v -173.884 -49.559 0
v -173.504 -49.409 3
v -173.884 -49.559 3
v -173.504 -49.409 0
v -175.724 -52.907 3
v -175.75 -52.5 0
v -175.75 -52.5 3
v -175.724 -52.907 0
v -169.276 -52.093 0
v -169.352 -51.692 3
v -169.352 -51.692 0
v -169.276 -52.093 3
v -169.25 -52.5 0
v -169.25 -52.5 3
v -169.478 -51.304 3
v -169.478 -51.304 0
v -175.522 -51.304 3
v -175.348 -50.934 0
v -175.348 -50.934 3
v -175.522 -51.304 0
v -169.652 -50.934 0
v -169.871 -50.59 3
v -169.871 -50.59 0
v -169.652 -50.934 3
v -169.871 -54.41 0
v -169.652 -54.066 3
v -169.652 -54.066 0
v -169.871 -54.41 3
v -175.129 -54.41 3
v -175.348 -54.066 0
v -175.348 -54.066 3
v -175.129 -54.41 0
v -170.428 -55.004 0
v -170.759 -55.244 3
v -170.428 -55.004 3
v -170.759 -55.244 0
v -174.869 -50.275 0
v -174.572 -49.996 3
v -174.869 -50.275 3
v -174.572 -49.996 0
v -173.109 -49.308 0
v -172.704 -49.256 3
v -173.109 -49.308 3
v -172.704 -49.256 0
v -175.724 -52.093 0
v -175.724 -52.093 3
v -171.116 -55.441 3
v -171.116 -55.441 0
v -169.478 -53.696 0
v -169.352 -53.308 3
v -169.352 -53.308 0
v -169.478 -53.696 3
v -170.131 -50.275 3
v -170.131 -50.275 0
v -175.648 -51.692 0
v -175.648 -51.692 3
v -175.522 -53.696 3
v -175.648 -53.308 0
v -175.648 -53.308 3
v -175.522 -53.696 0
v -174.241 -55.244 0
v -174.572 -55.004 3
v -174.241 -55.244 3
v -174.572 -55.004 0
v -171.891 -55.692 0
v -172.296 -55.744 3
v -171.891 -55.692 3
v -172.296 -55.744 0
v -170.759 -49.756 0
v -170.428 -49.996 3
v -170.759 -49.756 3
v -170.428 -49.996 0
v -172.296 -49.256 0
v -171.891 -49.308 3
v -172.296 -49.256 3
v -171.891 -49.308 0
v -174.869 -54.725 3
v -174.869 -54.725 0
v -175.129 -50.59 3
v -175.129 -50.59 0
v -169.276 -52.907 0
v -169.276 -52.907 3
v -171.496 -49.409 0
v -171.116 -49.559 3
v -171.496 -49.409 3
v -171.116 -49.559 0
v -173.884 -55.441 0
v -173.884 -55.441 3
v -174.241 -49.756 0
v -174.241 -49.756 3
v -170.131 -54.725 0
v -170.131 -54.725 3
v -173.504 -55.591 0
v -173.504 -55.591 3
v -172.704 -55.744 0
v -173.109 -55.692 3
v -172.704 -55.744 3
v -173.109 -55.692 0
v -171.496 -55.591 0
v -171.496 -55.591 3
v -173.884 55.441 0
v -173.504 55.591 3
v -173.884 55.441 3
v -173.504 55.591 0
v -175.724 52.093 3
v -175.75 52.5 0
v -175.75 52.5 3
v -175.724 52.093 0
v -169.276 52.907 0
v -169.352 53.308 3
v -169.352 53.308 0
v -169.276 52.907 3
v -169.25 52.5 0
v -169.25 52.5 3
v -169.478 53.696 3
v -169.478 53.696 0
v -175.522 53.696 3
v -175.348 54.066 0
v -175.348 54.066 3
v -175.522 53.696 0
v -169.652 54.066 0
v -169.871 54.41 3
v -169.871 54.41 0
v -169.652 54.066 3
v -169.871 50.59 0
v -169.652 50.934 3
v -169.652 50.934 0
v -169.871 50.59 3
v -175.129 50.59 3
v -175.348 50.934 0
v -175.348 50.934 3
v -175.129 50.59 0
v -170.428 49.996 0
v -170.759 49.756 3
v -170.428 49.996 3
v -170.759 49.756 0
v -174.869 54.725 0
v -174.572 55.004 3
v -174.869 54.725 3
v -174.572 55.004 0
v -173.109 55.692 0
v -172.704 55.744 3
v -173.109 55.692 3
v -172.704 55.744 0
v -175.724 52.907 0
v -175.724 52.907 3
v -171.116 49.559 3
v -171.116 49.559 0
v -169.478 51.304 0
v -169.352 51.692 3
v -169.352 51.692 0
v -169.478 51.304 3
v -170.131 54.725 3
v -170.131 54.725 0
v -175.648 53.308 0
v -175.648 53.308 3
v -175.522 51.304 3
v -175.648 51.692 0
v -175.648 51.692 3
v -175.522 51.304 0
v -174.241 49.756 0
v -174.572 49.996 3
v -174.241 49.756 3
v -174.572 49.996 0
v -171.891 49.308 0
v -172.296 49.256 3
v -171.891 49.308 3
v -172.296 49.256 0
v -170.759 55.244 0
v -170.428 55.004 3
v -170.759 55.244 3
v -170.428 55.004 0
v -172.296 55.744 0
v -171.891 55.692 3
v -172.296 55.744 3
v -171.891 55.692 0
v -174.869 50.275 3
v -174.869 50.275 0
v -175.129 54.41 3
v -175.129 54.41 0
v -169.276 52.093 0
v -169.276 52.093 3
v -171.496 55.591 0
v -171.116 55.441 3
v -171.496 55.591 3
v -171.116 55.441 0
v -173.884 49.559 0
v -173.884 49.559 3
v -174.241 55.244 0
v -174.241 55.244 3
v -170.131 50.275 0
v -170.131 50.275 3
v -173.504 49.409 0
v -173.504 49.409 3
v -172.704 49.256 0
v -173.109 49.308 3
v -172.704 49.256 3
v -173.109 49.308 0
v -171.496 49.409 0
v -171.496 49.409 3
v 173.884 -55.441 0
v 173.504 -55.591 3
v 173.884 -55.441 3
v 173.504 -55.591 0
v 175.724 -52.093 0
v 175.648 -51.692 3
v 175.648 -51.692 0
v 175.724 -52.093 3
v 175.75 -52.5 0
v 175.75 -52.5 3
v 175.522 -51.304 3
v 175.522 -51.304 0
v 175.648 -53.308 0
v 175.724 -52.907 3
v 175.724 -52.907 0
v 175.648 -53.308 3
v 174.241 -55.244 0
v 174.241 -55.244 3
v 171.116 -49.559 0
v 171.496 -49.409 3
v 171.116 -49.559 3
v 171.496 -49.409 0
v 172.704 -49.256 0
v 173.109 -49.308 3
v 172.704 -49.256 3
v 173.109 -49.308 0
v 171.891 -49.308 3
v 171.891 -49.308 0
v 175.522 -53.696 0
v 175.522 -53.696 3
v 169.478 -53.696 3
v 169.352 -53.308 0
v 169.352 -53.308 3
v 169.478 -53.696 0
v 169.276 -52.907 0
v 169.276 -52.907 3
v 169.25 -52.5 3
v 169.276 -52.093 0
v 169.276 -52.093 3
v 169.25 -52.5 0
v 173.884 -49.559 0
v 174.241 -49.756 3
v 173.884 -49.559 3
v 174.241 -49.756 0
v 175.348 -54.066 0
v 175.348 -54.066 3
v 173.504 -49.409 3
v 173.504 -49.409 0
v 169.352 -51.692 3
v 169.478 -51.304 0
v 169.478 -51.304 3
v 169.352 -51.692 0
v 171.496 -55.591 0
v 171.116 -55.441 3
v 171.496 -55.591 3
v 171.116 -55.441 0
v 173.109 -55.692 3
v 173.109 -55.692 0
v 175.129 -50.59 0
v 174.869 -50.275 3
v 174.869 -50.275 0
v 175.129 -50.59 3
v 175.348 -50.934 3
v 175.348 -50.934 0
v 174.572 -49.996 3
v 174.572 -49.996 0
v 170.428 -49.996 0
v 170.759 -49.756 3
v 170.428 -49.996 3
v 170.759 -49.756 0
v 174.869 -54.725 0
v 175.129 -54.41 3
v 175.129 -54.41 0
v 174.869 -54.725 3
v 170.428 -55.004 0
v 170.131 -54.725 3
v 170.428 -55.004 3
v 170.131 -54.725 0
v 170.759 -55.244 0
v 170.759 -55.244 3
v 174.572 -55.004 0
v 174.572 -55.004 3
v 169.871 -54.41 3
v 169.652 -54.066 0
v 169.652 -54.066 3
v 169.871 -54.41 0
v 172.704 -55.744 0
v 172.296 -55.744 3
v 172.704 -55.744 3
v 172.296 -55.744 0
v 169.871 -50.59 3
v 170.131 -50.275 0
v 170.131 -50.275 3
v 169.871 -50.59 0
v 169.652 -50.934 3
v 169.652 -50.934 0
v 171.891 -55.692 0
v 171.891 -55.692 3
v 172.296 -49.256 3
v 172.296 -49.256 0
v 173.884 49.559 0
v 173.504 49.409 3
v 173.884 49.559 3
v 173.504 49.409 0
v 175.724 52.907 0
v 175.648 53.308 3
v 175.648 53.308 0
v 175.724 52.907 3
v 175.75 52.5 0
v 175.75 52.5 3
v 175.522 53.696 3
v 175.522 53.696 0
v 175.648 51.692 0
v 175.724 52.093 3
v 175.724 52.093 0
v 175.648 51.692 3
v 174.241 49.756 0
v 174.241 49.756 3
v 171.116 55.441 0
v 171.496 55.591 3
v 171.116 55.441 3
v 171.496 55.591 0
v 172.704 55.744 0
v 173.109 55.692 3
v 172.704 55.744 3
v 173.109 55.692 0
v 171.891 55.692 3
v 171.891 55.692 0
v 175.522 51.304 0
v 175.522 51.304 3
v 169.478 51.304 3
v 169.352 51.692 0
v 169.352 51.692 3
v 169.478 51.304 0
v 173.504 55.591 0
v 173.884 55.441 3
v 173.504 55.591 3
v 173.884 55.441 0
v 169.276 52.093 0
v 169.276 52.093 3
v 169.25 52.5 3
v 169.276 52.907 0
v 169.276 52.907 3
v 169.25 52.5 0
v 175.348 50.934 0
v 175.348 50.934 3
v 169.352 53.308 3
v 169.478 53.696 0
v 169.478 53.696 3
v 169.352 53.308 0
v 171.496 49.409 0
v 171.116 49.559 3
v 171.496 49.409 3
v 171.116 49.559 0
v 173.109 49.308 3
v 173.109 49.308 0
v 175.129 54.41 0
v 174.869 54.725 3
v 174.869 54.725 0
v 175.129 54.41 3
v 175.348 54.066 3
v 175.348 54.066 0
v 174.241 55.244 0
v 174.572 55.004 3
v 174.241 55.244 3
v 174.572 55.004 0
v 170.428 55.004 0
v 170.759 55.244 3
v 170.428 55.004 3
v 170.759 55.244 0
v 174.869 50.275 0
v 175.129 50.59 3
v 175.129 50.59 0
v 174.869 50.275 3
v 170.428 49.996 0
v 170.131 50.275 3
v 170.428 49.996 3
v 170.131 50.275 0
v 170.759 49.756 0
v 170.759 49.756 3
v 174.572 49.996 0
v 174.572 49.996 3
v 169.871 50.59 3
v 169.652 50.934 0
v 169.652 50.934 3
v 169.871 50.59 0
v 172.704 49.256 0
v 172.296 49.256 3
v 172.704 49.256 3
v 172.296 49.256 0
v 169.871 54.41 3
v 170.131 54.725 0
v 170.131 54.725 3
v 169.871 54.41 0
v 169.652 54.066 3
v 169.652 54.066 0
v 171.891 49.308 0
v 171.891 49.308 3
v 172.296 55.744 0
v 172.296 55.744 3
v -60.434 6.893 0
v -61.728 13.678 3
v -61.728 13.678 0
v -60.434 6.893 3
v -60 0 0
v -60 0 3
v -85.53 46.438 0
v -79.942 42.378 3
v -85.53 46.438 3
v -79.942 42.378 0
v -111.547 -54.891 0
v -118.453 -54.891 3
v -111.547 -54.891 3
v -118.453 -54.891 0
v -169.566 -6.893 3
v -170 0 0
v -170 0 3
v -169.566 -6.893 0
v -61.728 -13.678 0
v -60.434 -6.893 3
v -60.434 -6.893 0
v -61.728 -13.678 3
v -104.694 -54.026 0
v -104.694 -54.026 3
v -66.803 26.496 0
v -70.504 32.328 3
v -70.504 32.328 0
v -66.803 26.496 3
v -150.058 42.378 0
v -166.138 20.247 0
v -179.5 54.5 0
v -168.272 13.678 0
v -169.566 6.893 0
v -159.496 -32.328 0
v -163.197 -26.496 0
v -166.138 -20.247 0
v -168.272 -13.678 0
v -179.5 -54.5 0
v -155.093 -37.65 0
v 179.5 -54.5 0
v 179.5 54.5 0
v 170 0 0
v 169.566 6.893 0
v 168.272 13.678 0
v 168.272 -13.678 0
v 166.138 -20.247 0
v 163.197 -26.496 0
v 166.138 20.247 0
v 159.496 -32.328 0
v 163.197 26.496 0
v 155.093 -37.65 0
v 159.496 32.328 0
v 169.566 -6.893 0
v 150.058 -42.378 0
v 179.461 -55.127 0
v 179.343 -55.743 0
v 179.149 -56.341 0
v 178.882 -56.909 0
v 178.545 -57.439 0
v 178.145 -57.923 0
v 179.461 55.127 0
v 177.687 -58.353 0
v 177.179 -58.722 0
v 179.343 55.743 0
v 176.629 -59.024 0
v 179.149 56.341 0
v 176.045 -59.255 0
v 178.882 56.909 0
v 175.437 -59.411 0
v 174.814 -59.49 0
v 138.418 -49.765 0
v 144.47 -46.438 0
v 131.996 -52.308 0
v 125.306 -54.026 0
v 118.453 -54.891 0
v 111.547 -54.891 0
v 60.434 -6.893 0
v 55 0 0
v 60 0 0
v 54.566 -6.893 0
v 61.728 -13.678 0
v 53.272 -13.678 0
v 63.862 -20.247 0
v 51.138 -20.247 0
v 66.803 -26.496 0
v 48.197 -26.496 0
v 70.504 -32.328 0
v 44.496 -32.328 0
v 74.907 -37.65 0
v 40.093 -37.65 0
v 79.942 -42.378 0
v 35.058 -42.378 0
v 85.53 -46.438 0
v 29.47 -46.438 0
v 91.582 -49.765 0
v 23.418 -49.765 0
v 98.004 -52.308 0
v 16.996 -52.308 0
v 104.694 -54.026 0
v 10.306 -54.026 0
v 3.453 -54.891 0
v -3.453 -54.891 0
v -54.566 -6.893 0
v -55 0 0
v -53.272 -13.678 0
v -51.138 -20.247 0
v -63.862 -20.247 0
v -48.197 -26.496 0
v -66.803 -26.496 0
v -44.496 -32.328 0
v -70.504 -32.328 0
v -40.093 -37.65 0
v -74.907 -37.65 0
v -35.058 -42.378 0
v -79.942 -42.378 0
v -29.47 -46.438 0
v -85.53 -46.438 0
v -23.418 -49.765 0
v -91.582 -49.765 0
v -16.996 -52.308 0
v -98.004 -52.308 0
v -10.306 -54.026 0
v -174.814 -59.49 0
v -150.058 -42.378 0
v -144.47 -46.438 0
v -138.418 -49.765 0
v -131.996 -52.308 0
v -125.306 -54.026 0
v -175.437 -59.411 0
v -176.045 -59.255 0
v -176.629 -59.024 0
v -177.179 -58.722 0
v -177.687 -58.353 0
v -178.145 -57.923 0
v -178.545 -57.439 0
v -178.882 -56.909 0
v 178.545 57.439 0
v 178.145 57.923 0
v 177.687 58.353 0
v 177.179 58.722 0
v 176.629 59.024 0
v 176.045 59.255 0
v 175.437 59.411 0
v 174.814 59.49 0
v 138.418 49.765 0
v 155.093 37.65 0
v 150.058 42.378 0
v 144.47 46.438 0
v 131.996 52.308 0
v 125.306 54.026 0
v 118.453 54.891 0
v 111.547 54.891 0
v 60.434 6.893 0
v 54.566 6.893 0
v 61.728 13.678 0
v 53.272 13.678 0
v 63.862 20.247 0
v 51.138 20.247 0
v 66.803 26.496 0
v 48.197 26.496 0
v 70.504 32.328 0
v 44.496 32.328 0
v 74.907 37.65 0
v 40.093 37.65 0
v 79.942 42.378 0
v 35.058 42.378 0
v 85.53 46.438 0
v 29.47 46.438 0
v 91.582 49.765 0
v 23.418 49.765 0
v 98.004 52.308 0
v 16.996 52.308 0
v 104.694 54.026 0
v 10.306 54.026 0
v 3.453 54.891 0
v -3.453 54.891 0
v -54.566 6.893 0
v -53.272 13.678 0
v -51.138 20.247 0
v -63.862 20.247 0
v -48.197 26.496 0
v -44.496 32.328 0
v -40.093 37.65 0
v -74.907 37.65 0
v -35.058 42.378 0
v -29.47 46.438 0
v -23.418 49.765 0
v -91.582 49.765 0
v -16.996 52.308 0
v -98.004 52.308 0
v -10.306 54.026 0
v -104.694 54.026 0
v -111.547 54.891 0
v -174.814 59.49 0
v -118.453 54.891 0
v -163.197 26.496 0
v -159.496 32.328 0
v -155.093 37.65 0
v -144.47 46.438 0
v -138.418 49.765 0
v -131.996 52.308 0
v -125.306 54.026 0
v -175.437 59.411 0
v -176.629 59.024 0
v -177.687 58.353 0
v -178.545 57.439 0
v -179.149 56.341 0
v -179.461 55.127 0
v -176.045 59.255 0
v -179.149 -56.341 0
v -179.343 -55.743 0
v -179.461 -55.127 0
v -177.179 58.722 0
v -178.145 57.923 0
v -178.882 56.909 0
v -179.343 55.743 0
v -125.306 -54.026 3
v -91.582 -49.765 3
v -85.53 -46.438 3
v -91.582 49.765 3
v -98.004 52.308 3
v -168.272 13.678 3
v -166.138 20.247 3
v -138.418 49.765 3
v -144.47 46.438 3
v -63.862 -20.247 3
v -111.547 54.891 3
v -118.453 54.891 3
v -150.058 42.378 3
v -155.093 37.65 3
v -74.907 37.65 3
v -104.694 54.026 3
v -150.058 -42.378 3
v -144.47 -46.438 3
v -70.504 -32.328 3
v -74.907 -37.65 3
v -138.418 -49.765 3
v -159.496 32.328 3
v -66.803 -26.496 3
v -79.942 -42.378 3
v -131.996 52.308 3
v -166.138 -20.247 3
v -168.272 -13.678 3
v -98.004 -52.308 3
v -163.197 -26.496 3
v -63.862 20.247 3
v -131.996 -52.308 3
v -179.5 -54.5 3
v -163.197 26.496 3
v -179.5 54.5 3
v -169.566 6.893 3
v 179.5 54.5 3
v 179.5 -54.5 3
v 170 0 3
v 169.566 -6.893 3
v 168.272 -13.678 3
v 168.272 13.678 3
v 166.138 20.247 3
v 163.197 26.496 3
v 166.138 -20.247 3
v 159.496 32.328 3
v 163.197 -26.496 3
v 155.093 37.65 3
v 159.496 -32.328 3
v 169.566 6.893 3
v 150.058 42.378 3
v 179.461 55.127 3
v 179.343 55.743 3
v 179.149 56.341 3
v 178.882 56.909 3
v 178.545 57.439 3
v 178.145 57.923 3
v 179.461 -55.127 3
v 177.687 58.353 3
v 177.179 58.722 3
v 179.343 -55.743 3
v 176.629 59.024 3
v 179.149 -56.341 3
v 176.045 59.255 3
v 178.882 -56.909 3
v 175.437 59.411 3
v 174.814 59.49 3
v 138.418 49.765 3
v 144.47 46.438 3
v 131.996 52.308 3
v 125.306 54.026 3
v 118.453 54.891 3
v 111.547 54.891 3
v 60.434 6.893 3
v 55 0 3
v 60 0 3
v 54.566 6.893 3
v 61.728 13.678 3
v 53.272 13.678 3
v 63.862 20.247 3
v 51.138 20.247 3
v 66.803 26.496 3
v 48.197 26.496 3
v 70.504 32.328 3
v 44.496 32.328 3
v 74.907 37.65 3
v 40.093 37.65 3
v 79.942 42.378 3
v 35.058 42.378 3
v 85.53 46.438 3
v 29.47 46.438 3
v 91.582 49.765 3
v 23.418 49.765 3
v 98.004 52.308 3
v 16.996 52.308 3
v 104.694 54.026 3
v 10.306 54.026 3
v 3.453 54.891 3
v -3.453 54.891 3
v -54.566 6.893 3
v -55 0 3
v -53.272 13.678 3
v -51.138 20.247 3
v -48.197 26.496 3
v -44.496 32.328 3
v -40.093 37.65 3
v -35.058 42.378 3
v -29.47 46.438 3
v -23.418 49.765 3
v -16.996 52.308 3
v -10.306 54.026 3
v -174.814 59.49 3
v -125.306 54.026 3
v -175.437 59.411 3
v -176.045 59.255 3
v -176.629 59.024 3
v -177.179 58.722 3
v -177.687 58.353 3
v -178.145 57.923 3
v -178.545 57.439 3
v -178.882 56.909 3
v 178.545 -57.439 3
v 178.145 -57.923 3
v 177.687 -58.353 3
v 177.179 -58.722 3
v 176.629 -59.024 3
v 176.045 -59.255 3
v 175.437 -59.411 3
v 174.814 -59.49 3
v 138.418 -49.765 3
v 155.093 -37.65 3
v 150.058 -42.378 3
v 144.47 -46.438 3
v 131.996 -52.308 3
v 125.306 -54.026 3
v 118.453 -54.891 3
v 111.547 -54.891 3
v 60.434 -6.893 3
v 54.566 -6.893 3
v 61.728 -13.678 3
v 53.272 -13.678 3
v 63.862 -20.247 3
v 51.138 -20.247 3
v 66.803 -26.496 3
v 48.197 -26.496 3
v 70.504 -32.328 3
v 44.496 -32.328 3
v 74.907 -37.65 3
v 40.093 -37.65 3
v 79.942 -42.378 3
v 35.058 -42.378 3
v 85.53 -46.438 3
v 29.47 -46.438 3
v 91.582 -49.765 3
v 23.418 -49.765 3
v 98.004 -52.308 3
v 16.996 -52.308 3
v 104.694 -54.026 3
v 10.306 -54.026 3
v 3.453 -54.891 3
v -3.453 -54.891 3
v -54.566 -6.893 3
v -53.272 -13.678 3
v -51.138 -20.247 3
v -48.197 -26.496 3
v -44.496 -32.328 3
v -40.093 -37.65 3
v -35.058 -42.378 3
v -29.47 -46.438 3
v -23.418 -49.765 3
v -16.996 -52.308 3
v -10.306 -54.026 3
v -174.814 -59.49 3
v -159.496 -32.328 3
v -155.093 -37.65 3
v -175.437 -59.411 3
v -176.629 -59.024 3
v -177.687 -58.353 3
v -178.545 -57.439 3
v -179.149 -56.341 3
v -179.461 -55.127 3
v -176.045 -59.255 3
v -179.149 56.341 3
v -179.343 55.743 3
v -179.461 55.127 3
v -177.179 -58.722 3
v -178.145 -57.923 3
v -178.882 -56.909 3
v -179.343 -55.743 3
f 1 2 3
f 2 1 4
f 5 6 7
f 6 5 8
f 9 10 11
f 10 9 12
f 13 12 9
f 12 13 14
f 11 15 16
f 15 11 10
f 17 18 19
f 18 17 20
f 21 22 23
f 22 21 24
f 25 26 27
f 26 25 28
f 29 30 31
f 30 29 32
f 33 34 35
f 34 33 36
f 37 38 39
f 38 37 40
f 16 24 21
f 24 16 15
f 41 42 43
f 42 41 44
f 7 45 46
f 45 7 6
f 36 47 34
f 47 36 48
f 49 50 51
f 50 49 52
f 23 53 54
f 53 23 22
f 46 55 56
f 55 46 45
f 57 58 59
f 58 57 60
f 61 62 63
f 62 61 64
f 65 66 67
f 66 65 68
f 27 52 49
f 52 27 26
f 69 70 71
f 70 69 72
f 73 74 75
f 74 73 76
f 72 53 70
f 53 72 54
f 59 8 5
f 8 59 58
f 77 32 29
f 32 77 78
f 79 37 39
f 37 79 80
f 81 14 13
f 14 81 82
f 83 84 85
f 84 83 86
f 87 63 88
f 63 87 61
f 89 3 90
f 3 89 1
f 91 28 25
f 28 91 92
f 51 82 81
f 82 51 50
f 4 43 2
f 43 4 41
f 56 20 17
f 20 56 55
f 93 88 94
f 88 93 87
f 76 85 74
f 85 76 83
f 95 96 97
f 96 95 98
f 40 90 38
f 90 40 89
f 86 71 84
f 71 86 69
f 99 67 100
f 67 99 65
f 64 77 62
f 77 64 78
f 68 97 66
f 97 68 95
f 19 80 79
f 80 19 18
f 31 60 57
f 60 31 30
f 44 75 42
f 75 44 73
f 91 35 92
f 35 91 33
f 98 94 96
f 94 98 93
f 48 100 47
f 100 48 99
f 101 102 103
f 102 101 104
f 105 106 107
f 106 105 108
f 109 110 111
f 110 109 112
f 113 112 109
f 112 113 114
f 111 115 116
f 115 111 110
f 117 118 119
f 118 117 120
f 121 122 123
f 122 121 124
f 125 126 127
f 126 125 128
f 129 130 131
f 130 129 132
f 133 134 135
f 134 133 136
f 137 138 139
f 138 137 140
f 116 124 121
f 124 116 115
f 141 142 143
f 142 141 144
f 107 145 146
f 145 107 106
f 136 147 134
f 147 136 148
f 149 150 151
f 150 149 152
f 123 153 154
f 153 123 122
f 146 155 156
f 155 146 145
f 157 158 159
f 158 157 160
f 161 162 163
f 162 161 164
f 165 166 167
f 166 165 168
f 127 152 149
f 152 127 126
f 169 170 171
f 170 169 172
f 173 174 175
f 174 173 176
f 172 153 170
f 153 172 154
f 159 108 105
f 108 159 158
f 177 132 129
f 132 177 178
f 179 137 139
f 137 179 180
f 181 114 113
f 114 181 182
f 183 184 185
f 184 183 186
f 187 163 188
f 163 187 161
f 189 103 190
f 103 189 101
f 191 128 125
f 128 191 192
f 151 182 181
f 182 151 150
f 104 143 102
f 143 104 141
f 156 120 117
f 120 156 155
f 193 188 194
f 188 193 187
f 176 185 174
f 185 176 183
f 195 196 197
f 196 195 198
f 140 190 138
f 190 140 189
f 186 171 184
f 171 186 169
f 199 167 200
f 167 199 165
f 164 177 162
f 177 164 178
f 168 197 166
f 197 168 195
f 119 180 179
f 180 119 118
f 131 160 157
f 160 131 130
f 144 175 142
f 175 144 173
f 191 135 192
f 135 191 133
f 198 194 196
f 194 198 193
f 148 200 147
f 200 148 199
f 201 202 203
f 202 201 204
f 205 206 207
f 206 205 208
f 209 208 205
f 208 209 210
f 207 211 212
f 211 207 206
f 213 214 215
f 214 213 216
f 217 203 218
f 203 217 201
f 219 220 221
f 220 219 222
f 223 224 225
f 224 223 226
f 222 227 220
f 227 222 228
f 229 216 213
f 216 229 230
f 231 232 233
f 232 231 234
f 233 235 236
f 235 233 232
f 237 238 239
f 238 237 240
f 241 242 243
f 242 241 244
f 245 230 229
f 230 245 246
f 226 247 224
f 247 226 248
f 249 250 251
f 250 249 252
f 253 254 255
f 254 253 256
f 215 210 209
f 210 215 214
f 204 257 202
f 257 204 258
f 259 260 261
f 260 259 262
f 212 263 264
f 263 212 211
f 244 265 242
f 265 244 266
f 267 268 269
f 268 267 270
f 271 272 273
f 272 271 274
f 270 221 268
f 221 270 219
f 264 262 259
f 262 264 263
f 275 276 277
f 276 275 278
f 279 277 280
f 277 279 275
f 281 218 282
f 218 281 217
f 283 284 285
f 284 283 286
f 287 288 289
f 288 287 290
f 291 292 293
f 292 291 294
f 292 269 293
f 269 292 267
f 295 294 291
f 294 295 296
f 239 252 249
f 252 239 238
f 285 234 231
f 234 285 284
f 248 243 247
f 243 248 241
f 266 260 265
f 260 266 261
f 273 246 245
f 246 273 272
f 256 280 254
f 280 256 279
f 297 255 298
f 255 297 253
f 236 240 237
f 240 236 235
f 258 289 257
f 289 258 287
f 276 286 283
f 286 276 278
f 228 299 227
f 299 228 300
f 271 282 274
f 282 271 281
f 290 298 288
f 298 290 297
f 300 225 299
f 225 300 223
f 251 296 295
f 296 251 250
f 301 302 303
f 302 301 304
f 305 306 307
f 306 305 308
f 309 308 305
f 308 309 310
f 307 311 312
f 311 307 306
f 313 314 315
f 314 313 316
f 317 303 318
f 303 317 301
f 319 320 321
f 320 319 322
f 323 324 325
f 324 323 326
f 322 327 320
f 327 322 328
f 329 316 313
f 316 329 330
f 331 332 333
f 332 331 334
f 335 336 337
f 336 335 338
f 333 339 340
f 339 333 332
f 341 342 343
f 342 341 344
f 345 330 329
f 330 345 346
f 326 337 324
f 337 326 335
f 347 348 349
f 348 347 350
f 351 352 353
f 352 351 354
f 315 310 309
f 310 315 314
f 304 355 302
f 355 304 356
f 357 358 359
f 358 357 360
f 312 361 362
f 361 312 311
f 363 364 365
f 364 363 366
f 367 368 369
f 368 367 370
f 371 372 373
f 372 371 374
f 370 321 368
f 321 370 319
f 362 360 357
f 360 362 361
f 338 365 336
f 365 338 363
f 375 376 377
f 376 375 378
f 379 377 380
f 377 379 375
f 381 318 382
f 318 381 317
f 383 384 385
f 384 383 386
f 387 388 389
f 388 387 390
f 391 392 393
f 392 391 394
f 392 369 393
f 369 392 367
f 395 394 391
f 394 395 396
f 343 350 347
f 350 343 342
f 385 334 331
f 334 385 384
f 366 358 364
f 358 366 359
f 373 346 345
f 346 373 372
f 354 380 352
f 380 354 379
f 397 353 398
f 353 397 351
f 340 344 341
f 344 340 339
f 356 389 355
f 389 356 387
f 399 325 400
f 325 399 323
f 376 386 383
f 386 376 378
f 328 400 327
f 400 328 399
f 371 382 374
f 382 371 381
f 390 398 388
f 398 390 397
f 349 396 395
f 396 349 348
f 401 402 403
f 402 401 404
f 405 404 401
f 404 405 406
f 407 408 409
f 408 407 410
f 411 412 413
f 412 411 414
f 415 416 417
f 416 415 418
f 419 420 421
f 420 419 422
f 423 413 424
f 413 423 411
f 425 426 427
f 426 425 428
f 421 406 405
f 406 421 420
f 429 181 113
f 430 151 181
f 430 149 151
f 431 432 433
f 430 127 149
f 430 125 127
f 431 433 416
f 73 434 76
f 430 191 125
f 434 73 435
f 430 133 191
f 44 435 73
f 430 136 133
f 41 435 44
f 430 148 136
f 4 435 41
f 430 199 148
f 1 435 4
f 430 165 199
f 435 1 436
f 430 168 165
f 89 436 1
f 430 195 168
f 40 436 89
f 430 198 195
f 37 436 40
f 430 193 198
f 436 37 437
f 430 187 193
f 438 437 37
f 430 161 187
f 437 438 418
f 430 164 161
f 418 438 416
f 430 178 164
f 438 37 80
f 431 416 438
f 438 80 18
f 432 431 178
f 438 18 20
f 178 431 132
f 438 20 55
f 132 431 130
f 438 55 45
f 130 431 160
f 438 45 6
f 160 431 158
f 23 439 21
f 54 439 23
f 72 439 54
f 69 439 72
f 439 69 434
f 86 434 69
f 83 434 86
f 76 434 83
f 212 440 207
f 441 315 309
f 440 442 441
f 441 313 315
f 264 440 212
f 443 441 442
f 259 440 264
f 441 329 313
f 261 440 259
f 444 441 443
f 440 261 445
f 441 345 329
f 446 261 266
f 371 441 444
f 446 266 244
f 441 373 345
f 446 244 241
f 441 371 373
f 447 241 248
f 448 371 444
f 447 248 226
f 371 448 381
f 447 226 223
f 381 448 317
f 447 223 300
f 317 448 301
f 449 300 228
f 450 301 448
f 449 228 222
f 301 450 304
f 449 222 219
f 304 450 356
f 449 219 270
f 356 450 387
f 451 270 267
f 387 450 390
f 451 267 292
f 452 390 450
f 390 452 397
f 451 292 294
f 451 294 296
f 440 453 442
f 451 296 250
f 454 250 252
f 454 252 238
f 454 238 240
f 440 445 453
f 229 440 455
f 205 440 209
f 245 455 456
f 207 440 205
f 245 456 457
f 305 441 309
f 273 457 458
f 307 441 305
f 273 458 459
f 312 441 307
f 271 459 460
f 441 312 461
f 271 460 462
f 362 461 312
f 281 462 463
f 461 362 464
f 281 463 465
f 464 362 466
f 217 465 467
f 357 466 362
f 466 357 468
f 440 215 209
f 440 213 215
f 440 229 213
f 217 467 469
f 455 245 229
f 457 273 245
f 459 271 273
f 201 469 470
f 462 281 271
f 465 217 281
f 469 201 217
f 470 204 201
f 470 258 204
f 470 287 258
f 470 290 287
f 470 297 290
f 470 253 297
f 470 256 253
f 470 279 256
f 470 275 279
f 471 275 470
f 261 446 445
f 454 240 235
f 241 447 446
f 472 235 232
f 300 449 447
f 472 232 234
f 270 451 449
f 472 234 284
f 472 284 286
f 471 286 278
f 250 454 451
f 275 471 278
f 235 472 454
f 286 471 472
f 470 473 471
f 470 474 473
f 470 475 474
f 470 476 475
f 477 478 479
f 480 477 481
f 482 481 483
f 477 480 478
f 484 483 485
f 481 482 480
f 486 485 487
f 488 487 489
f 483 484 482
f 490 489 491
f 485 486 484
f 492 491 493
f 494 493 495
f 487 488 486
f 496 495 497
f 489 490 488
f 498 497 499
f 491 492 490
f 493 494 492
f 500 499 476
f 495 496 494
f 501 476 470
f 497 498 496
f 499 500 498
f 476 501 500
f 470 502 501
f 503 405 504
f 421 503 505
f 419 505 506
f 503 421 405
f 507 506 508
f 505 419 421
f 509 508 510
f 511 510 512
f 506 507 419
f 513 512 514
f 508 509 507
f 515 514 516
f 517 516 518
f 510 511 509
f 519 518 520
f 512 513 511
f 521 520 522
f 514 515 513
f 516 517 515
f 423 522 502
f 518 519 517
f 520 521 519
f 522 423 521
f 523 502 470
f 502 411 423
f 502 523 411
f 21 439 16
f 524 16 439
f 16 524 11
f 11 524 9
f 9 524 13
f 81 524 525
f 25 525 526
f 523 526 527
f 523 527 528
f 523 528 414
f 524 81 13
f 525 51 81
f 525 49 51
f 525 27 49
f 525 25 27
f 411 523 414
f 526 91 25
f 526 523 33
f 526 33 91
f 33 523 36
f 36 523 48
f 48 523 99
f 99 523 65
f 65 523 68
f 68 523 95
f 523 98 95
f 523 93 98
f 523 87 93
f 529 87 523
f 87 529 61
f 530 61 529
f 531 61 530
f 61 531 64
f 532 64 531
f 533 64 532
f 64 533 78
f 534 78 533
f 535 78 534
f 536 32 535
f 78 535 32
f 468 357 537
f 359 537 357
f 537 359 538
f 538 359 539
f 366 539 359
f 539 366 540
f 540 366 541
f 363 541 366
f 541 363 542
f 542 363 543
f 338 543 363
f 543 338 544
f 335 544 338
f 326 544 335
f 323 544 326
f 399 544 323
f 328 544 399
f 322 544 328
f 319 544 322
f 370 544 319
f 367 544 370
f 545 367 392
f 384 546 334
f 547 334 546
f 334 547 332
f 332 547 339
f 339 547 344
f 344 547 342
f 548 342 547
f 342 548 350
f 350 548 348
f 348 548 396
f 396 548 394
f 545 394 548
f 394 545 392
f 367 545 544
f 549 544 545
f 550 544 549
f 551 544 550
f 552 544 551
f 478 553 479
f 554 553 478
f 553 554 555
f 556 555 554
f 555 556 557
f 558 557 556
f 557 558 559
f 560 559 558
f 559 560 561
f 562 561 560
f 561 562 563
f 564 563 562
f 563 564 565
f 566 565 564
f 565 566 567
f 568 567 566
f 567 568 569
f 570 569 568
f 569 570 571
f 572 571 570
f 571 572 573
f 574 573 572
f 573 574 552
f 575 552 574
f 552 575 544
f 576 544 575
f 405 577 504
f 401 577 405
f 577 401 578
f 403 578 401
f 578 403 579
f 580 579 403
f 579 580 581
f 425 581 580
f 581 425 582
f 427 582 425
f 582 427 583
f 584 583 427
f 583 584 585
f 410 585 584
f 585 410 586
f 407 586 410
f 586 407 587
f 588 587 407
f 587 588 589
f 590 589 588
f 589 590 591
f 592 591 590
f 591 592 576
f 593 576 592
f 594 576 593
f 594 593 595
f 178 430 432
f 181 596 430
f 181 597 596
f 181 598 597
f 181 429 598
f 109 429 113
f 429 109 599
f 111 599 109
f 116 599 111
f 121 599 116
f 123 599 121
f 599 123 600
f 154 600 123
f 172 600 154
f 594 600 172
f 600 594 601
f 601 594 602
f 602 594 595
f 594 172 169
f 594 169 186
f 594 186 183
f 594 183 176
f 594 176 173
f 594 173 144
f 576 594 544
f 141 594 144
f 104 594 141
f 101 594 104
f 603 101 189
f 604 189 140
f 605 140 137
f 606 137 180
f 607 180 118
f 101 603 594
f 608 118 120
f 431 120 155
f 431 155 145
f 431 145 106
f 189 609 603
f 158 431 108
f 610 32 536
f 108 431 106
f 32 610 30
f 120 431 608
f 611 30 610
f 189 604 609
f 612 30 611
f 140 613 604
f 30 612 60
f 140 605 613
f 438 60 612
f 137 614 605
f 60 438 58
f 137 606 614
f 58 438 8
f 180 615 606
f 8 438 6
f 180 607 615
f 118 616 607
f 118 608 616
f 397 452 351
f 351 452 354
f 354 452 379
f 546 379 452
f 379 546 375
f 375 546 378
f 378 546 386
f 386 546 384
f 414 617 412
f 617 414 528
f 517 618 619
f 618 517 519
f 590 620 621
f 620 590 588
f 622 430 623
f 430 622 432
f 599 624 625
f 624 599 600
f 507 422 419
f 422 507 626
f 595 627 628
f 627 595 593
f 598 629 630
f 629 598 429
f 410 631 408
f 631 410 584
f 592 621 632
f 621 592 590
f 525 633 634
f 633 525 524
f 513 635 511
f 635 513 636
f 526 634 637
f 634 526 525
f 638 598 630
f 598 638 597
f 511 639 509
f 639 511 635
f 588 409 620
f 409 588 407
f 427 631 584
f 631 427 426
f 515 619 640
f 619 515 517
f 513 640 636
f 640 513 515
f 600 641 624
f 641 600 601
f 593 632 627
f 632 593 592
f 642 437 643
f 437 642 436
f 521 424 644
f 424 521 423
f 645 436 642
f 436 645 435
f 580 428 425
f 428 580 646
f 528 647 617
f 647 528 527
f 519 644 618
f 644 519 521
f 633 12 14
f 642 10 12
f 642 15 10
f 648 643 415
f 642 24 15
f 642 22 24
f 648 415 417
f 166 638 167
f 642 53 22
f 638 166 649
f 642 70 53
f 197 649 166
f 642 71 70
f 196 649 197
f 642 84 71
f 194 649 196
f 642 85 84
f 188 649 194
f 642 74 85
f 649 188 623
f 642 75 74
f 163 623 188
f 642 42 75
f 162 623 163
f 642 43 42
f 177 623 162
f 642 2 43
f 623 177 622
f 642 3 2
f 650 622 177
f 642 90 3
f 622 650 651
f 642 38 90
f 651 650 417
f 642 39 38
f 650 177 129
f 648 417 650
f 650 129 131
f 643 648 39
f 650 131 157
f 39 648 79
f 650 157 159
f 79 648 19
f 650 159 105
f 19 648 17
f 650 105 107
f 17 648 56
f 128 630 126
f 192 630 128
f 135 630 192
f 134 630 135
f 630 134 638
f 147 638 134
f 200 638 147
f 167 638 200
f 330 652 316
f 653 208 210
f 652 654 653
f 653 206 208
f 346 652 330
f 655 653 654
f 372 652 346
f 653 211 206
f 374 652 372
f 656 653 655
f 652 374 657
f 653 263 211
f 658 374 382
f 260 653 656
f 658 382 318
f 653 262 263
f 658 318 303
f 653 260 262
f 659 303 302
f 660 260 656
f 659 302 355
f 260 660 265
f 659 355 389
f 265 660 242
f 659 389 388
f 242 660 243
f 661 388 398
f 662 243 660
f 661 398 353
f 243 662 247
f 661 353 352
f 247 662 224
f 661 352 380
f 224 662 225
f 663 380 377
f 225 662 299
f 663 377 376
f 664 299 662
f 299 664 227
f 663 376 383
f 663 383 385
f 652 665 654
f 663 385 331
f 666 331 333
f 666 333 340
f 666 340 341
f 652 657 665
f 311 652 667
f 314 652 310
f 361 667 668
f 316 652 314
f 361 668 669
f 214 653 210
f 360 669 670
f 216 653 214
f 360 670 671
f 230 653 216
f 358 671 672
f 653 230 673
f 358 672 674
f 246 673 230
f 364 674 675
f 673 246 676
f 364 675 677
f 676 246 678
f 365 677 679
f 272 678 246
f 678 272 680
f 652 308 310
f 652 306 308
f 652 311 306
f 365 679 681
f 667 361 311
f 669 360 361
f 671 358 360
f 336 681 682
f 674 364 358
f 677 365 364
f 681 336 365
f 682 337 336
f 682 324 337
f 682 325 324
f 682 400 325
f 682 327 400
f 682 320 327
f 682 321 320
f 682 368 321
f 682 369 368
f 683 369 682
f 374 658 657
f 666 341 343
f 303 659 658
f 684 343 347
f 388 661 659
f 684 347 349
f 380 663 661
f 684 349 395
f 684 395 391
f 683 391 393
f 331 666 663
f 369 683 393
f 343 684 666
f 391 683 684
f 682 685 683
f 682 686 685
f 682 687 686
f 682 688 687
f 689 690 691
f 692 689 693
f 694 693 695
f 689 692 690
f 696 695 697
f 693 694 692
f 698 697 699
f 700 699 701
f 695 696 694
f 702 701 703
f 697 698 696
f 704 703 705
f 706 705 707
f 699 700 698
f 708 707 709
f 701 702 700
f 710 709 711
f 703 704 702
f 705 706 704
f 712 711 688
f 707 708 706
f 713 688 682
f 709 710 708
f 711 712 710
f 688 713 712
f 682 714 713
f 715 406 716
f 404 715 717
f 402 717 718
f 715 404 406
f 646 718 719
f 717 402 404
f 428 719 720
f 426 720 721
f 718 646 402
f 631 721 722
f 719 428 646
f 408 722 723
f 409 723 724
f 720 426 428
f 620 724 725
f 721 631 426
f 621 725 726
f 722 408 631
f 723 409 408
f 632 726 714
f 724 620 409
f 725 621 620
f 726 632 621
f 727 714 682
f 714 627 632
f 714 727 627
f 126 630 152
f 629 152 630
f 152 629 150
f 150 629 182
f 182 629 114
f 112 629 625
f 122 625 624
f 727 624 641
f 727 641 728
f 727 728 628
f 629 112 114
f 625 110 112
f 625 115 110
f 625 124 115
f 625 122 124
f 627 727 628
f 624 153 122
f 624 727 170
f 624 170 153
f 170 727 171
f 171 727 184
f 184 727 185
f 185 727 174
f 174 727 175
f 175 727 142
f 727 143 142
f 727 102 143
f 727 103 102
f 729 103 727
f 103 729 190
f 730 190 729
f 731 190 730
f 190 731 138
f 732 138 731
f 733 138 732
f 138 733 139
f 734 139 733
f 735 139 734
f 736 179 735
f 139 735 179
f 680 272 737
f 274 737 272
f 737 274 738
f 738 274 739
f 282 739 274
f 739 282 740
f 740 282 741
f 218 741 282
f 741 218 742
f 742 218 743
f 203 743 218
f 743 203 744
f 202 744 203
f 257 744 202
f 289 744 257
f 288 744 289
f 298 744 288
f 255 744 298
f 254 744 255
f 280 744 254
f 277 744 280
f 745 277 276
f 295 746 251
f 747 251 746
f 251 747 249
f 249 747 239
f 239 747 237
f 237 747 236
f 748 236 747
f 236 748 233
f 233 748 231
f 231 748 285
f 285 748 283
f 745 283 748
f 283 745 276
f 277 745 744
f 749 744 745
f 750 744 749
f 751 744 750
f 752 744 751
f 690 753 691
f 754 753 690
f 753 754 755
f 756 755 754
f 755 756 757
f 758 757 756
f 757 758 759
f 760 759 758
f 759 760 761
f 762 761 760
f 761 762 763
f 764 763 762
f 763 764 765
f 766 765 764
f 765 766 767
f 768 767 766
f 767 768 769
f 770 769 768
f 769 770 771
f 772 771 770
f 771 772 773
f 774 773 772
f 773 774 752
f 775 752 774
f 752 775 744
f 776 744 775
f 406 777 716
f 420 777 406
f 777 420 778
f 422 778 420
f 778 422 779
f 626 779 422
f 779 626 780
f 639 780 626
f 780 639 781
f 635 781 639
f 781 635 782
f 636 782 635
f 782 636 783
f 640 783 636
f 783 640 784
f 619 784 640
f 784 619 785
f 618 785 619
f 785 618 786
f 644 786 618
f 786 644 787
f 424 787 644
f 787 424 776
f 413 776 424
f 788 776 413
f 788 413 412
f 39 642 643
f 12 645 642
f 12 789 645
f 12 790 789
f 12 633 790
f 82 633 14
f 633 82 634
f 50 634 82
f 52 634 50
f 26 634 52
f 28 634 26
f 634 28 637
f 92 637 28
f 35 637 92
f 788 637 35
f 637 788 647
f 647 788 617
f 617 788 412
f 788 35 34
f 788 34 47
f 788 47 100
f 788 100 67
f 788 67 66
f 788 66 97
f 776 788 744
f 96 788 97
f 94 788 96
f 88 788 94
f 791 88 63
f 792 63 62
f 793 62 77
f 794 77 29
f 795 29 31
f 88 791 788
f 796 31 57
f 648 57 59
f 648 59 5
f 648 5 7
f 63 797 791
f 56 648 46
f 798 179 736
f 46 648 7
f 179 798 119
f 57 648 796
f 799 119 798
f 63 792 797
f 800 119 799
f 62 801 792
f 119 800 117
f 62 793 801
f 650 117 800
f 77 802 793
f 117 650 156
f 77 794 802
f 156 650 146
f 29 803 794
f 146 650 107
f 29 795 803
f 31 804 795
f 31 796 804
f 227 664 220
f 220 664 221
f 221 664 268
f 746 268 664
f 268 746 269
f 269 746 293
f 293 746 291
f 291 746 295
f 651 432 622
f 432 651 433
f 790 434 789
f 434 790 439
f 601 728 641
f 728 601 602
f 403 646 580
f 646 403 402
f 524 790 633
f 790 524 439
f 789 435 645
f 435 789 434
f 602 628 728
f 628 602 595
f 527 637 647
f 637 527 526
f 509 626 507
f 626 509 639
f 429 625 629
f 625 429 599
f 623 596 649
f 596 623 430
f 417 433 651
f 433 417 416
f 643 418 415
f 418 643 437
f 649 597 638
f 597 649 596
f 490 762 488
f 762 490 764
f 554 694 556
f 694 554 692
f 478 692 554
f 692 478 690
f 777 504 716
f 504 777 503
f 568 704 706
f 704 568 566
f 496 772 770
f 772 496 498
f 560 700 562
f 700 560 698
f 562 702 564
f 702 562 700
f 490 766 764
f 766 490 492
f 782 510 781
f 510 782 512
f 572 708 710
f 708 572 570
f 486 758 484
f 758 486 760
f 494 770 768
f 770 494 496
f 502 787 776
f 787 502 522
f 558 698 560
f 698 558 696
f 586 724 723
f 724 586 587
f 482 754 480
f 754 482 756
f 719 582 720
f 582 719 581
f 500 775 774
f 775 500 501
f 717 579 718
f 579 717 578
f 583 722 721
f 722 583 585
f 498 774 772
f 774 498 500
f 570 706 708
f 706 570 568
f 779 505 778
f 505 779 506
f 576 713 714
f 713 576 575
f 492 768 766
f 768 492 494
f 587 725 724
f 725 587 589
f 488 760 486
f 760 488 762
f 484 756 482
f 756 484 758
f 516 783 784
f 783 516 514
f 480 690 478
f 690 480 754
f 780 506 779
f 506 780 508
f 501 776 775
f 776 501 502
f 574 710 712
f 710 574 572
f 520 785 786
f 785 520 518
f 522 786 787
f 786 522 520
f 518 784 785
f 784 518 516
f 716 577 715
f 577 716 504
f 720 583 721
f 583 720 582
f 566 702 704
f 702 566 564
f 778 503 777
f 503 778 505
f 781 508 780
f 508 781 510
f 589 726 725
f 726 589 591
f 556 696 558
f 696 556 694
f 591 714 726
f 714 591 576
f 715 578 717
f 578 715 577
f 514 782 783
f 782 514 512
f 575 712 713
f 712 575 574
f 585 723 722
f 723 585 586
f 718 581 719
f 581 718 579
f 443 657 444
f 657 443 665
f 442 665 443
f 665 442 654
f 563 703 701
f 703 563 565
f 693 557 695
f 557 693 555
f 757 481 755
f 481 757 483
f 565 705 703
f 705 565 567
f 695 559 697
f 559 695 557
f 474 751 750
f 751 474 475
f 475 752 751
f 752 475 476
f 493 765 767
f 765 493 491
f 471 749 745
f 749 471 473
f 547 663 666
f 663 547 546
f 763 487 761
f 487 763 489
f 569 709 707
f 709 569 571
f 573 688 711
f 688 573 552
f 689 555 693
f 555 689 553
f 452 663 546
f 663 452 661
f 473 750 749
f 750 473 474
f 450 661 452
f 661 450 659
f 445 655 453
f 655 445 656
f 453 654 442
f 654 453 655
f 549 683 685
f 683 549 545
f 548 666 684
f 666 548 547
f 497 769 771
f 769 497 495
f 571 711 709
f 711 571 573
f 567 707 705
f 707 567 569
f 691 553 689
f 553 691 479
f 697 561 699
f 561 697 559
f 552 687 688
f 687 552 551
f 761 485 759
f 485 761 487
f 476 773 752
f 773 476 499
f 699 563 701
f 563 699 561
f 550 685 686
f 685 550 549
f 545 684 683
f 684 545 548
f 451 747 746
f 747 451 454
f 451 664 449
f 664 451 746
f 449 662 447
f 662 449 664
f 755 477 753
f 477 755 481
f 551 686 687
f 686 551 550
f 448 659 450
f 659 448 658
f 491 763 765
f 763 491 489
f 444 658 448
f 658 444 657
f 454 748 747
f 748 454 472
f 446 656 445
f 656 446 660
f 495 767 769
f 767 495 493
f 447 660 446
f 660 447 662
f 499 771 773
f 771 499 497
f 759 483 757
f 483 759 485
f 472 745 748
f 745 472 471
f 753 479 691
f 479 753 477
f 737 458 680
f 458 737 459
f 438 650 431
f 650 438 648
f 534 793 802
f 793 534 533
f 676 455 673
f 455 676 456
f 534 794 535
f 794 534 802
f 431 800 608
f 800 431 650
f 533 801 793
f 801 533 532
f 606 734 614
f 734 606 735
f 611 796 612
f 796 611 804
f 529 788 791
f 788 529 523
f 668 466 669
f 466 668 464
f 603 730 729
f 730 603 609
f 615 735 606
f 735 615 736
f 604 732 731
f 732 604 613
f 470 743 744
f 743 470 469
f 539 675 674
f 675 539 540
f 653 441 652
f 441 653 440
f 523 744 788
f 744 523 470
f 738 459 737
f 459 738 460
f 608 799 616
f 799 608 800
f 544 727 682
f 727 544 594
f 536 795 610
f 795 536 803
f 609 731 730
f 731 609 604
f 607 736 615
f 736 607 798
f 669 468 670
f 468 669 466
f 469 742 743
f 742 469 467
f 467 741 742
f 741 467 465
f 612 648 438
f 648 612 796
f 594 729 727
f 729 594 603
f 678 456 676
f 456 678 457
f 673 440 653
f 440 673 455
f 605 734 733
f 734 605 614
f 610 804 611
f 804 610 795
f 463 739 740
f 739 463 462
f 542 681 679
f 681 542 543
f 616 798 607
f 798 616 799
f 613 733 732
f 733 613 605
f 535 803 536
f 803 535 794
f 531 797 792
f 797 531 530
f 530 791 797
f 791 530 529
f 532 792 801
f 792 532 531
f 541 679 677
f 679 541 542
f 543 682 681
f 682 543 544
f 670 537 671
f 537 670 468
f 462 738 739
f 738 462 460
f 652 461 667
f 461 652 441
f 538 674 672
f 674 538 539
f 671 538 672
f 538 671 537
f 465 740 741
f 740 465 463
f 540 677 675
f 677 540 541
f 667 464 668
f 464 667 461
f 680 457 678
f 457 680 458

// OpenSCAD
$fn = 50;

difference() {
	union() {
		hull() {
			translate(v = [-174.5, 54.5, 0]) {
				cylinder(h = 3, r = 5);
			}
			translate(v = [174.5, 54.5, 0]) {
				cylinder(h = 3, r = 5);
			}
			translate(v = [-174.5, -54.5, 0]) {
				cylinder(h = 3, r = 5);
			}
			translate(v = [174.5, -54.5, 0]) {
				cylinder(h = 3, r = 5);
			}
		}
	}
	union() {
		translate(v = [-172.5, -52.5, -100.0]) {
			cylinder(h = 200, r = 3.25);
		}
		translate(v = [-172.5, 52.5, -100.0]) {
			cylinder(h = 200, r = 3.25);
		}
		translate(v = [172.5, -52.5, -100.0]) {
			cylinder(h = 200, r = 3.25);
		}
		translate(v = [172.5, 52.5, -100.0]) {
			cylinder(h = 200, r = 3.25);
		}
		translate(v = [-172.5, -52.5, -100.0]) {
			cylinder(h = 200, r = 1.8);
		}
		translate(v = [-172.5, 52.5, -100.0]) {
			cylinder(h = 200, r = 1.8);
		}
		translate(v = [172.5, -52.5, -100.0]) {
			cylinder(h = 200, r = 1.8);
		}
		translate(v = [172.5, 52.5, -100.0]) {
			cylinder(h = 200, r = 1.8);
		}
		translate(v = [-115.0, 0, 0.0]) {
			cylinder(h = 3, r = 55.0);
		}
		cylinder(h = 3, r = 55.0);
		translate(v = [115.0, 0, 0.0]) {
			cylinder(h = 3, r = 55.0);
		}
	}
}
